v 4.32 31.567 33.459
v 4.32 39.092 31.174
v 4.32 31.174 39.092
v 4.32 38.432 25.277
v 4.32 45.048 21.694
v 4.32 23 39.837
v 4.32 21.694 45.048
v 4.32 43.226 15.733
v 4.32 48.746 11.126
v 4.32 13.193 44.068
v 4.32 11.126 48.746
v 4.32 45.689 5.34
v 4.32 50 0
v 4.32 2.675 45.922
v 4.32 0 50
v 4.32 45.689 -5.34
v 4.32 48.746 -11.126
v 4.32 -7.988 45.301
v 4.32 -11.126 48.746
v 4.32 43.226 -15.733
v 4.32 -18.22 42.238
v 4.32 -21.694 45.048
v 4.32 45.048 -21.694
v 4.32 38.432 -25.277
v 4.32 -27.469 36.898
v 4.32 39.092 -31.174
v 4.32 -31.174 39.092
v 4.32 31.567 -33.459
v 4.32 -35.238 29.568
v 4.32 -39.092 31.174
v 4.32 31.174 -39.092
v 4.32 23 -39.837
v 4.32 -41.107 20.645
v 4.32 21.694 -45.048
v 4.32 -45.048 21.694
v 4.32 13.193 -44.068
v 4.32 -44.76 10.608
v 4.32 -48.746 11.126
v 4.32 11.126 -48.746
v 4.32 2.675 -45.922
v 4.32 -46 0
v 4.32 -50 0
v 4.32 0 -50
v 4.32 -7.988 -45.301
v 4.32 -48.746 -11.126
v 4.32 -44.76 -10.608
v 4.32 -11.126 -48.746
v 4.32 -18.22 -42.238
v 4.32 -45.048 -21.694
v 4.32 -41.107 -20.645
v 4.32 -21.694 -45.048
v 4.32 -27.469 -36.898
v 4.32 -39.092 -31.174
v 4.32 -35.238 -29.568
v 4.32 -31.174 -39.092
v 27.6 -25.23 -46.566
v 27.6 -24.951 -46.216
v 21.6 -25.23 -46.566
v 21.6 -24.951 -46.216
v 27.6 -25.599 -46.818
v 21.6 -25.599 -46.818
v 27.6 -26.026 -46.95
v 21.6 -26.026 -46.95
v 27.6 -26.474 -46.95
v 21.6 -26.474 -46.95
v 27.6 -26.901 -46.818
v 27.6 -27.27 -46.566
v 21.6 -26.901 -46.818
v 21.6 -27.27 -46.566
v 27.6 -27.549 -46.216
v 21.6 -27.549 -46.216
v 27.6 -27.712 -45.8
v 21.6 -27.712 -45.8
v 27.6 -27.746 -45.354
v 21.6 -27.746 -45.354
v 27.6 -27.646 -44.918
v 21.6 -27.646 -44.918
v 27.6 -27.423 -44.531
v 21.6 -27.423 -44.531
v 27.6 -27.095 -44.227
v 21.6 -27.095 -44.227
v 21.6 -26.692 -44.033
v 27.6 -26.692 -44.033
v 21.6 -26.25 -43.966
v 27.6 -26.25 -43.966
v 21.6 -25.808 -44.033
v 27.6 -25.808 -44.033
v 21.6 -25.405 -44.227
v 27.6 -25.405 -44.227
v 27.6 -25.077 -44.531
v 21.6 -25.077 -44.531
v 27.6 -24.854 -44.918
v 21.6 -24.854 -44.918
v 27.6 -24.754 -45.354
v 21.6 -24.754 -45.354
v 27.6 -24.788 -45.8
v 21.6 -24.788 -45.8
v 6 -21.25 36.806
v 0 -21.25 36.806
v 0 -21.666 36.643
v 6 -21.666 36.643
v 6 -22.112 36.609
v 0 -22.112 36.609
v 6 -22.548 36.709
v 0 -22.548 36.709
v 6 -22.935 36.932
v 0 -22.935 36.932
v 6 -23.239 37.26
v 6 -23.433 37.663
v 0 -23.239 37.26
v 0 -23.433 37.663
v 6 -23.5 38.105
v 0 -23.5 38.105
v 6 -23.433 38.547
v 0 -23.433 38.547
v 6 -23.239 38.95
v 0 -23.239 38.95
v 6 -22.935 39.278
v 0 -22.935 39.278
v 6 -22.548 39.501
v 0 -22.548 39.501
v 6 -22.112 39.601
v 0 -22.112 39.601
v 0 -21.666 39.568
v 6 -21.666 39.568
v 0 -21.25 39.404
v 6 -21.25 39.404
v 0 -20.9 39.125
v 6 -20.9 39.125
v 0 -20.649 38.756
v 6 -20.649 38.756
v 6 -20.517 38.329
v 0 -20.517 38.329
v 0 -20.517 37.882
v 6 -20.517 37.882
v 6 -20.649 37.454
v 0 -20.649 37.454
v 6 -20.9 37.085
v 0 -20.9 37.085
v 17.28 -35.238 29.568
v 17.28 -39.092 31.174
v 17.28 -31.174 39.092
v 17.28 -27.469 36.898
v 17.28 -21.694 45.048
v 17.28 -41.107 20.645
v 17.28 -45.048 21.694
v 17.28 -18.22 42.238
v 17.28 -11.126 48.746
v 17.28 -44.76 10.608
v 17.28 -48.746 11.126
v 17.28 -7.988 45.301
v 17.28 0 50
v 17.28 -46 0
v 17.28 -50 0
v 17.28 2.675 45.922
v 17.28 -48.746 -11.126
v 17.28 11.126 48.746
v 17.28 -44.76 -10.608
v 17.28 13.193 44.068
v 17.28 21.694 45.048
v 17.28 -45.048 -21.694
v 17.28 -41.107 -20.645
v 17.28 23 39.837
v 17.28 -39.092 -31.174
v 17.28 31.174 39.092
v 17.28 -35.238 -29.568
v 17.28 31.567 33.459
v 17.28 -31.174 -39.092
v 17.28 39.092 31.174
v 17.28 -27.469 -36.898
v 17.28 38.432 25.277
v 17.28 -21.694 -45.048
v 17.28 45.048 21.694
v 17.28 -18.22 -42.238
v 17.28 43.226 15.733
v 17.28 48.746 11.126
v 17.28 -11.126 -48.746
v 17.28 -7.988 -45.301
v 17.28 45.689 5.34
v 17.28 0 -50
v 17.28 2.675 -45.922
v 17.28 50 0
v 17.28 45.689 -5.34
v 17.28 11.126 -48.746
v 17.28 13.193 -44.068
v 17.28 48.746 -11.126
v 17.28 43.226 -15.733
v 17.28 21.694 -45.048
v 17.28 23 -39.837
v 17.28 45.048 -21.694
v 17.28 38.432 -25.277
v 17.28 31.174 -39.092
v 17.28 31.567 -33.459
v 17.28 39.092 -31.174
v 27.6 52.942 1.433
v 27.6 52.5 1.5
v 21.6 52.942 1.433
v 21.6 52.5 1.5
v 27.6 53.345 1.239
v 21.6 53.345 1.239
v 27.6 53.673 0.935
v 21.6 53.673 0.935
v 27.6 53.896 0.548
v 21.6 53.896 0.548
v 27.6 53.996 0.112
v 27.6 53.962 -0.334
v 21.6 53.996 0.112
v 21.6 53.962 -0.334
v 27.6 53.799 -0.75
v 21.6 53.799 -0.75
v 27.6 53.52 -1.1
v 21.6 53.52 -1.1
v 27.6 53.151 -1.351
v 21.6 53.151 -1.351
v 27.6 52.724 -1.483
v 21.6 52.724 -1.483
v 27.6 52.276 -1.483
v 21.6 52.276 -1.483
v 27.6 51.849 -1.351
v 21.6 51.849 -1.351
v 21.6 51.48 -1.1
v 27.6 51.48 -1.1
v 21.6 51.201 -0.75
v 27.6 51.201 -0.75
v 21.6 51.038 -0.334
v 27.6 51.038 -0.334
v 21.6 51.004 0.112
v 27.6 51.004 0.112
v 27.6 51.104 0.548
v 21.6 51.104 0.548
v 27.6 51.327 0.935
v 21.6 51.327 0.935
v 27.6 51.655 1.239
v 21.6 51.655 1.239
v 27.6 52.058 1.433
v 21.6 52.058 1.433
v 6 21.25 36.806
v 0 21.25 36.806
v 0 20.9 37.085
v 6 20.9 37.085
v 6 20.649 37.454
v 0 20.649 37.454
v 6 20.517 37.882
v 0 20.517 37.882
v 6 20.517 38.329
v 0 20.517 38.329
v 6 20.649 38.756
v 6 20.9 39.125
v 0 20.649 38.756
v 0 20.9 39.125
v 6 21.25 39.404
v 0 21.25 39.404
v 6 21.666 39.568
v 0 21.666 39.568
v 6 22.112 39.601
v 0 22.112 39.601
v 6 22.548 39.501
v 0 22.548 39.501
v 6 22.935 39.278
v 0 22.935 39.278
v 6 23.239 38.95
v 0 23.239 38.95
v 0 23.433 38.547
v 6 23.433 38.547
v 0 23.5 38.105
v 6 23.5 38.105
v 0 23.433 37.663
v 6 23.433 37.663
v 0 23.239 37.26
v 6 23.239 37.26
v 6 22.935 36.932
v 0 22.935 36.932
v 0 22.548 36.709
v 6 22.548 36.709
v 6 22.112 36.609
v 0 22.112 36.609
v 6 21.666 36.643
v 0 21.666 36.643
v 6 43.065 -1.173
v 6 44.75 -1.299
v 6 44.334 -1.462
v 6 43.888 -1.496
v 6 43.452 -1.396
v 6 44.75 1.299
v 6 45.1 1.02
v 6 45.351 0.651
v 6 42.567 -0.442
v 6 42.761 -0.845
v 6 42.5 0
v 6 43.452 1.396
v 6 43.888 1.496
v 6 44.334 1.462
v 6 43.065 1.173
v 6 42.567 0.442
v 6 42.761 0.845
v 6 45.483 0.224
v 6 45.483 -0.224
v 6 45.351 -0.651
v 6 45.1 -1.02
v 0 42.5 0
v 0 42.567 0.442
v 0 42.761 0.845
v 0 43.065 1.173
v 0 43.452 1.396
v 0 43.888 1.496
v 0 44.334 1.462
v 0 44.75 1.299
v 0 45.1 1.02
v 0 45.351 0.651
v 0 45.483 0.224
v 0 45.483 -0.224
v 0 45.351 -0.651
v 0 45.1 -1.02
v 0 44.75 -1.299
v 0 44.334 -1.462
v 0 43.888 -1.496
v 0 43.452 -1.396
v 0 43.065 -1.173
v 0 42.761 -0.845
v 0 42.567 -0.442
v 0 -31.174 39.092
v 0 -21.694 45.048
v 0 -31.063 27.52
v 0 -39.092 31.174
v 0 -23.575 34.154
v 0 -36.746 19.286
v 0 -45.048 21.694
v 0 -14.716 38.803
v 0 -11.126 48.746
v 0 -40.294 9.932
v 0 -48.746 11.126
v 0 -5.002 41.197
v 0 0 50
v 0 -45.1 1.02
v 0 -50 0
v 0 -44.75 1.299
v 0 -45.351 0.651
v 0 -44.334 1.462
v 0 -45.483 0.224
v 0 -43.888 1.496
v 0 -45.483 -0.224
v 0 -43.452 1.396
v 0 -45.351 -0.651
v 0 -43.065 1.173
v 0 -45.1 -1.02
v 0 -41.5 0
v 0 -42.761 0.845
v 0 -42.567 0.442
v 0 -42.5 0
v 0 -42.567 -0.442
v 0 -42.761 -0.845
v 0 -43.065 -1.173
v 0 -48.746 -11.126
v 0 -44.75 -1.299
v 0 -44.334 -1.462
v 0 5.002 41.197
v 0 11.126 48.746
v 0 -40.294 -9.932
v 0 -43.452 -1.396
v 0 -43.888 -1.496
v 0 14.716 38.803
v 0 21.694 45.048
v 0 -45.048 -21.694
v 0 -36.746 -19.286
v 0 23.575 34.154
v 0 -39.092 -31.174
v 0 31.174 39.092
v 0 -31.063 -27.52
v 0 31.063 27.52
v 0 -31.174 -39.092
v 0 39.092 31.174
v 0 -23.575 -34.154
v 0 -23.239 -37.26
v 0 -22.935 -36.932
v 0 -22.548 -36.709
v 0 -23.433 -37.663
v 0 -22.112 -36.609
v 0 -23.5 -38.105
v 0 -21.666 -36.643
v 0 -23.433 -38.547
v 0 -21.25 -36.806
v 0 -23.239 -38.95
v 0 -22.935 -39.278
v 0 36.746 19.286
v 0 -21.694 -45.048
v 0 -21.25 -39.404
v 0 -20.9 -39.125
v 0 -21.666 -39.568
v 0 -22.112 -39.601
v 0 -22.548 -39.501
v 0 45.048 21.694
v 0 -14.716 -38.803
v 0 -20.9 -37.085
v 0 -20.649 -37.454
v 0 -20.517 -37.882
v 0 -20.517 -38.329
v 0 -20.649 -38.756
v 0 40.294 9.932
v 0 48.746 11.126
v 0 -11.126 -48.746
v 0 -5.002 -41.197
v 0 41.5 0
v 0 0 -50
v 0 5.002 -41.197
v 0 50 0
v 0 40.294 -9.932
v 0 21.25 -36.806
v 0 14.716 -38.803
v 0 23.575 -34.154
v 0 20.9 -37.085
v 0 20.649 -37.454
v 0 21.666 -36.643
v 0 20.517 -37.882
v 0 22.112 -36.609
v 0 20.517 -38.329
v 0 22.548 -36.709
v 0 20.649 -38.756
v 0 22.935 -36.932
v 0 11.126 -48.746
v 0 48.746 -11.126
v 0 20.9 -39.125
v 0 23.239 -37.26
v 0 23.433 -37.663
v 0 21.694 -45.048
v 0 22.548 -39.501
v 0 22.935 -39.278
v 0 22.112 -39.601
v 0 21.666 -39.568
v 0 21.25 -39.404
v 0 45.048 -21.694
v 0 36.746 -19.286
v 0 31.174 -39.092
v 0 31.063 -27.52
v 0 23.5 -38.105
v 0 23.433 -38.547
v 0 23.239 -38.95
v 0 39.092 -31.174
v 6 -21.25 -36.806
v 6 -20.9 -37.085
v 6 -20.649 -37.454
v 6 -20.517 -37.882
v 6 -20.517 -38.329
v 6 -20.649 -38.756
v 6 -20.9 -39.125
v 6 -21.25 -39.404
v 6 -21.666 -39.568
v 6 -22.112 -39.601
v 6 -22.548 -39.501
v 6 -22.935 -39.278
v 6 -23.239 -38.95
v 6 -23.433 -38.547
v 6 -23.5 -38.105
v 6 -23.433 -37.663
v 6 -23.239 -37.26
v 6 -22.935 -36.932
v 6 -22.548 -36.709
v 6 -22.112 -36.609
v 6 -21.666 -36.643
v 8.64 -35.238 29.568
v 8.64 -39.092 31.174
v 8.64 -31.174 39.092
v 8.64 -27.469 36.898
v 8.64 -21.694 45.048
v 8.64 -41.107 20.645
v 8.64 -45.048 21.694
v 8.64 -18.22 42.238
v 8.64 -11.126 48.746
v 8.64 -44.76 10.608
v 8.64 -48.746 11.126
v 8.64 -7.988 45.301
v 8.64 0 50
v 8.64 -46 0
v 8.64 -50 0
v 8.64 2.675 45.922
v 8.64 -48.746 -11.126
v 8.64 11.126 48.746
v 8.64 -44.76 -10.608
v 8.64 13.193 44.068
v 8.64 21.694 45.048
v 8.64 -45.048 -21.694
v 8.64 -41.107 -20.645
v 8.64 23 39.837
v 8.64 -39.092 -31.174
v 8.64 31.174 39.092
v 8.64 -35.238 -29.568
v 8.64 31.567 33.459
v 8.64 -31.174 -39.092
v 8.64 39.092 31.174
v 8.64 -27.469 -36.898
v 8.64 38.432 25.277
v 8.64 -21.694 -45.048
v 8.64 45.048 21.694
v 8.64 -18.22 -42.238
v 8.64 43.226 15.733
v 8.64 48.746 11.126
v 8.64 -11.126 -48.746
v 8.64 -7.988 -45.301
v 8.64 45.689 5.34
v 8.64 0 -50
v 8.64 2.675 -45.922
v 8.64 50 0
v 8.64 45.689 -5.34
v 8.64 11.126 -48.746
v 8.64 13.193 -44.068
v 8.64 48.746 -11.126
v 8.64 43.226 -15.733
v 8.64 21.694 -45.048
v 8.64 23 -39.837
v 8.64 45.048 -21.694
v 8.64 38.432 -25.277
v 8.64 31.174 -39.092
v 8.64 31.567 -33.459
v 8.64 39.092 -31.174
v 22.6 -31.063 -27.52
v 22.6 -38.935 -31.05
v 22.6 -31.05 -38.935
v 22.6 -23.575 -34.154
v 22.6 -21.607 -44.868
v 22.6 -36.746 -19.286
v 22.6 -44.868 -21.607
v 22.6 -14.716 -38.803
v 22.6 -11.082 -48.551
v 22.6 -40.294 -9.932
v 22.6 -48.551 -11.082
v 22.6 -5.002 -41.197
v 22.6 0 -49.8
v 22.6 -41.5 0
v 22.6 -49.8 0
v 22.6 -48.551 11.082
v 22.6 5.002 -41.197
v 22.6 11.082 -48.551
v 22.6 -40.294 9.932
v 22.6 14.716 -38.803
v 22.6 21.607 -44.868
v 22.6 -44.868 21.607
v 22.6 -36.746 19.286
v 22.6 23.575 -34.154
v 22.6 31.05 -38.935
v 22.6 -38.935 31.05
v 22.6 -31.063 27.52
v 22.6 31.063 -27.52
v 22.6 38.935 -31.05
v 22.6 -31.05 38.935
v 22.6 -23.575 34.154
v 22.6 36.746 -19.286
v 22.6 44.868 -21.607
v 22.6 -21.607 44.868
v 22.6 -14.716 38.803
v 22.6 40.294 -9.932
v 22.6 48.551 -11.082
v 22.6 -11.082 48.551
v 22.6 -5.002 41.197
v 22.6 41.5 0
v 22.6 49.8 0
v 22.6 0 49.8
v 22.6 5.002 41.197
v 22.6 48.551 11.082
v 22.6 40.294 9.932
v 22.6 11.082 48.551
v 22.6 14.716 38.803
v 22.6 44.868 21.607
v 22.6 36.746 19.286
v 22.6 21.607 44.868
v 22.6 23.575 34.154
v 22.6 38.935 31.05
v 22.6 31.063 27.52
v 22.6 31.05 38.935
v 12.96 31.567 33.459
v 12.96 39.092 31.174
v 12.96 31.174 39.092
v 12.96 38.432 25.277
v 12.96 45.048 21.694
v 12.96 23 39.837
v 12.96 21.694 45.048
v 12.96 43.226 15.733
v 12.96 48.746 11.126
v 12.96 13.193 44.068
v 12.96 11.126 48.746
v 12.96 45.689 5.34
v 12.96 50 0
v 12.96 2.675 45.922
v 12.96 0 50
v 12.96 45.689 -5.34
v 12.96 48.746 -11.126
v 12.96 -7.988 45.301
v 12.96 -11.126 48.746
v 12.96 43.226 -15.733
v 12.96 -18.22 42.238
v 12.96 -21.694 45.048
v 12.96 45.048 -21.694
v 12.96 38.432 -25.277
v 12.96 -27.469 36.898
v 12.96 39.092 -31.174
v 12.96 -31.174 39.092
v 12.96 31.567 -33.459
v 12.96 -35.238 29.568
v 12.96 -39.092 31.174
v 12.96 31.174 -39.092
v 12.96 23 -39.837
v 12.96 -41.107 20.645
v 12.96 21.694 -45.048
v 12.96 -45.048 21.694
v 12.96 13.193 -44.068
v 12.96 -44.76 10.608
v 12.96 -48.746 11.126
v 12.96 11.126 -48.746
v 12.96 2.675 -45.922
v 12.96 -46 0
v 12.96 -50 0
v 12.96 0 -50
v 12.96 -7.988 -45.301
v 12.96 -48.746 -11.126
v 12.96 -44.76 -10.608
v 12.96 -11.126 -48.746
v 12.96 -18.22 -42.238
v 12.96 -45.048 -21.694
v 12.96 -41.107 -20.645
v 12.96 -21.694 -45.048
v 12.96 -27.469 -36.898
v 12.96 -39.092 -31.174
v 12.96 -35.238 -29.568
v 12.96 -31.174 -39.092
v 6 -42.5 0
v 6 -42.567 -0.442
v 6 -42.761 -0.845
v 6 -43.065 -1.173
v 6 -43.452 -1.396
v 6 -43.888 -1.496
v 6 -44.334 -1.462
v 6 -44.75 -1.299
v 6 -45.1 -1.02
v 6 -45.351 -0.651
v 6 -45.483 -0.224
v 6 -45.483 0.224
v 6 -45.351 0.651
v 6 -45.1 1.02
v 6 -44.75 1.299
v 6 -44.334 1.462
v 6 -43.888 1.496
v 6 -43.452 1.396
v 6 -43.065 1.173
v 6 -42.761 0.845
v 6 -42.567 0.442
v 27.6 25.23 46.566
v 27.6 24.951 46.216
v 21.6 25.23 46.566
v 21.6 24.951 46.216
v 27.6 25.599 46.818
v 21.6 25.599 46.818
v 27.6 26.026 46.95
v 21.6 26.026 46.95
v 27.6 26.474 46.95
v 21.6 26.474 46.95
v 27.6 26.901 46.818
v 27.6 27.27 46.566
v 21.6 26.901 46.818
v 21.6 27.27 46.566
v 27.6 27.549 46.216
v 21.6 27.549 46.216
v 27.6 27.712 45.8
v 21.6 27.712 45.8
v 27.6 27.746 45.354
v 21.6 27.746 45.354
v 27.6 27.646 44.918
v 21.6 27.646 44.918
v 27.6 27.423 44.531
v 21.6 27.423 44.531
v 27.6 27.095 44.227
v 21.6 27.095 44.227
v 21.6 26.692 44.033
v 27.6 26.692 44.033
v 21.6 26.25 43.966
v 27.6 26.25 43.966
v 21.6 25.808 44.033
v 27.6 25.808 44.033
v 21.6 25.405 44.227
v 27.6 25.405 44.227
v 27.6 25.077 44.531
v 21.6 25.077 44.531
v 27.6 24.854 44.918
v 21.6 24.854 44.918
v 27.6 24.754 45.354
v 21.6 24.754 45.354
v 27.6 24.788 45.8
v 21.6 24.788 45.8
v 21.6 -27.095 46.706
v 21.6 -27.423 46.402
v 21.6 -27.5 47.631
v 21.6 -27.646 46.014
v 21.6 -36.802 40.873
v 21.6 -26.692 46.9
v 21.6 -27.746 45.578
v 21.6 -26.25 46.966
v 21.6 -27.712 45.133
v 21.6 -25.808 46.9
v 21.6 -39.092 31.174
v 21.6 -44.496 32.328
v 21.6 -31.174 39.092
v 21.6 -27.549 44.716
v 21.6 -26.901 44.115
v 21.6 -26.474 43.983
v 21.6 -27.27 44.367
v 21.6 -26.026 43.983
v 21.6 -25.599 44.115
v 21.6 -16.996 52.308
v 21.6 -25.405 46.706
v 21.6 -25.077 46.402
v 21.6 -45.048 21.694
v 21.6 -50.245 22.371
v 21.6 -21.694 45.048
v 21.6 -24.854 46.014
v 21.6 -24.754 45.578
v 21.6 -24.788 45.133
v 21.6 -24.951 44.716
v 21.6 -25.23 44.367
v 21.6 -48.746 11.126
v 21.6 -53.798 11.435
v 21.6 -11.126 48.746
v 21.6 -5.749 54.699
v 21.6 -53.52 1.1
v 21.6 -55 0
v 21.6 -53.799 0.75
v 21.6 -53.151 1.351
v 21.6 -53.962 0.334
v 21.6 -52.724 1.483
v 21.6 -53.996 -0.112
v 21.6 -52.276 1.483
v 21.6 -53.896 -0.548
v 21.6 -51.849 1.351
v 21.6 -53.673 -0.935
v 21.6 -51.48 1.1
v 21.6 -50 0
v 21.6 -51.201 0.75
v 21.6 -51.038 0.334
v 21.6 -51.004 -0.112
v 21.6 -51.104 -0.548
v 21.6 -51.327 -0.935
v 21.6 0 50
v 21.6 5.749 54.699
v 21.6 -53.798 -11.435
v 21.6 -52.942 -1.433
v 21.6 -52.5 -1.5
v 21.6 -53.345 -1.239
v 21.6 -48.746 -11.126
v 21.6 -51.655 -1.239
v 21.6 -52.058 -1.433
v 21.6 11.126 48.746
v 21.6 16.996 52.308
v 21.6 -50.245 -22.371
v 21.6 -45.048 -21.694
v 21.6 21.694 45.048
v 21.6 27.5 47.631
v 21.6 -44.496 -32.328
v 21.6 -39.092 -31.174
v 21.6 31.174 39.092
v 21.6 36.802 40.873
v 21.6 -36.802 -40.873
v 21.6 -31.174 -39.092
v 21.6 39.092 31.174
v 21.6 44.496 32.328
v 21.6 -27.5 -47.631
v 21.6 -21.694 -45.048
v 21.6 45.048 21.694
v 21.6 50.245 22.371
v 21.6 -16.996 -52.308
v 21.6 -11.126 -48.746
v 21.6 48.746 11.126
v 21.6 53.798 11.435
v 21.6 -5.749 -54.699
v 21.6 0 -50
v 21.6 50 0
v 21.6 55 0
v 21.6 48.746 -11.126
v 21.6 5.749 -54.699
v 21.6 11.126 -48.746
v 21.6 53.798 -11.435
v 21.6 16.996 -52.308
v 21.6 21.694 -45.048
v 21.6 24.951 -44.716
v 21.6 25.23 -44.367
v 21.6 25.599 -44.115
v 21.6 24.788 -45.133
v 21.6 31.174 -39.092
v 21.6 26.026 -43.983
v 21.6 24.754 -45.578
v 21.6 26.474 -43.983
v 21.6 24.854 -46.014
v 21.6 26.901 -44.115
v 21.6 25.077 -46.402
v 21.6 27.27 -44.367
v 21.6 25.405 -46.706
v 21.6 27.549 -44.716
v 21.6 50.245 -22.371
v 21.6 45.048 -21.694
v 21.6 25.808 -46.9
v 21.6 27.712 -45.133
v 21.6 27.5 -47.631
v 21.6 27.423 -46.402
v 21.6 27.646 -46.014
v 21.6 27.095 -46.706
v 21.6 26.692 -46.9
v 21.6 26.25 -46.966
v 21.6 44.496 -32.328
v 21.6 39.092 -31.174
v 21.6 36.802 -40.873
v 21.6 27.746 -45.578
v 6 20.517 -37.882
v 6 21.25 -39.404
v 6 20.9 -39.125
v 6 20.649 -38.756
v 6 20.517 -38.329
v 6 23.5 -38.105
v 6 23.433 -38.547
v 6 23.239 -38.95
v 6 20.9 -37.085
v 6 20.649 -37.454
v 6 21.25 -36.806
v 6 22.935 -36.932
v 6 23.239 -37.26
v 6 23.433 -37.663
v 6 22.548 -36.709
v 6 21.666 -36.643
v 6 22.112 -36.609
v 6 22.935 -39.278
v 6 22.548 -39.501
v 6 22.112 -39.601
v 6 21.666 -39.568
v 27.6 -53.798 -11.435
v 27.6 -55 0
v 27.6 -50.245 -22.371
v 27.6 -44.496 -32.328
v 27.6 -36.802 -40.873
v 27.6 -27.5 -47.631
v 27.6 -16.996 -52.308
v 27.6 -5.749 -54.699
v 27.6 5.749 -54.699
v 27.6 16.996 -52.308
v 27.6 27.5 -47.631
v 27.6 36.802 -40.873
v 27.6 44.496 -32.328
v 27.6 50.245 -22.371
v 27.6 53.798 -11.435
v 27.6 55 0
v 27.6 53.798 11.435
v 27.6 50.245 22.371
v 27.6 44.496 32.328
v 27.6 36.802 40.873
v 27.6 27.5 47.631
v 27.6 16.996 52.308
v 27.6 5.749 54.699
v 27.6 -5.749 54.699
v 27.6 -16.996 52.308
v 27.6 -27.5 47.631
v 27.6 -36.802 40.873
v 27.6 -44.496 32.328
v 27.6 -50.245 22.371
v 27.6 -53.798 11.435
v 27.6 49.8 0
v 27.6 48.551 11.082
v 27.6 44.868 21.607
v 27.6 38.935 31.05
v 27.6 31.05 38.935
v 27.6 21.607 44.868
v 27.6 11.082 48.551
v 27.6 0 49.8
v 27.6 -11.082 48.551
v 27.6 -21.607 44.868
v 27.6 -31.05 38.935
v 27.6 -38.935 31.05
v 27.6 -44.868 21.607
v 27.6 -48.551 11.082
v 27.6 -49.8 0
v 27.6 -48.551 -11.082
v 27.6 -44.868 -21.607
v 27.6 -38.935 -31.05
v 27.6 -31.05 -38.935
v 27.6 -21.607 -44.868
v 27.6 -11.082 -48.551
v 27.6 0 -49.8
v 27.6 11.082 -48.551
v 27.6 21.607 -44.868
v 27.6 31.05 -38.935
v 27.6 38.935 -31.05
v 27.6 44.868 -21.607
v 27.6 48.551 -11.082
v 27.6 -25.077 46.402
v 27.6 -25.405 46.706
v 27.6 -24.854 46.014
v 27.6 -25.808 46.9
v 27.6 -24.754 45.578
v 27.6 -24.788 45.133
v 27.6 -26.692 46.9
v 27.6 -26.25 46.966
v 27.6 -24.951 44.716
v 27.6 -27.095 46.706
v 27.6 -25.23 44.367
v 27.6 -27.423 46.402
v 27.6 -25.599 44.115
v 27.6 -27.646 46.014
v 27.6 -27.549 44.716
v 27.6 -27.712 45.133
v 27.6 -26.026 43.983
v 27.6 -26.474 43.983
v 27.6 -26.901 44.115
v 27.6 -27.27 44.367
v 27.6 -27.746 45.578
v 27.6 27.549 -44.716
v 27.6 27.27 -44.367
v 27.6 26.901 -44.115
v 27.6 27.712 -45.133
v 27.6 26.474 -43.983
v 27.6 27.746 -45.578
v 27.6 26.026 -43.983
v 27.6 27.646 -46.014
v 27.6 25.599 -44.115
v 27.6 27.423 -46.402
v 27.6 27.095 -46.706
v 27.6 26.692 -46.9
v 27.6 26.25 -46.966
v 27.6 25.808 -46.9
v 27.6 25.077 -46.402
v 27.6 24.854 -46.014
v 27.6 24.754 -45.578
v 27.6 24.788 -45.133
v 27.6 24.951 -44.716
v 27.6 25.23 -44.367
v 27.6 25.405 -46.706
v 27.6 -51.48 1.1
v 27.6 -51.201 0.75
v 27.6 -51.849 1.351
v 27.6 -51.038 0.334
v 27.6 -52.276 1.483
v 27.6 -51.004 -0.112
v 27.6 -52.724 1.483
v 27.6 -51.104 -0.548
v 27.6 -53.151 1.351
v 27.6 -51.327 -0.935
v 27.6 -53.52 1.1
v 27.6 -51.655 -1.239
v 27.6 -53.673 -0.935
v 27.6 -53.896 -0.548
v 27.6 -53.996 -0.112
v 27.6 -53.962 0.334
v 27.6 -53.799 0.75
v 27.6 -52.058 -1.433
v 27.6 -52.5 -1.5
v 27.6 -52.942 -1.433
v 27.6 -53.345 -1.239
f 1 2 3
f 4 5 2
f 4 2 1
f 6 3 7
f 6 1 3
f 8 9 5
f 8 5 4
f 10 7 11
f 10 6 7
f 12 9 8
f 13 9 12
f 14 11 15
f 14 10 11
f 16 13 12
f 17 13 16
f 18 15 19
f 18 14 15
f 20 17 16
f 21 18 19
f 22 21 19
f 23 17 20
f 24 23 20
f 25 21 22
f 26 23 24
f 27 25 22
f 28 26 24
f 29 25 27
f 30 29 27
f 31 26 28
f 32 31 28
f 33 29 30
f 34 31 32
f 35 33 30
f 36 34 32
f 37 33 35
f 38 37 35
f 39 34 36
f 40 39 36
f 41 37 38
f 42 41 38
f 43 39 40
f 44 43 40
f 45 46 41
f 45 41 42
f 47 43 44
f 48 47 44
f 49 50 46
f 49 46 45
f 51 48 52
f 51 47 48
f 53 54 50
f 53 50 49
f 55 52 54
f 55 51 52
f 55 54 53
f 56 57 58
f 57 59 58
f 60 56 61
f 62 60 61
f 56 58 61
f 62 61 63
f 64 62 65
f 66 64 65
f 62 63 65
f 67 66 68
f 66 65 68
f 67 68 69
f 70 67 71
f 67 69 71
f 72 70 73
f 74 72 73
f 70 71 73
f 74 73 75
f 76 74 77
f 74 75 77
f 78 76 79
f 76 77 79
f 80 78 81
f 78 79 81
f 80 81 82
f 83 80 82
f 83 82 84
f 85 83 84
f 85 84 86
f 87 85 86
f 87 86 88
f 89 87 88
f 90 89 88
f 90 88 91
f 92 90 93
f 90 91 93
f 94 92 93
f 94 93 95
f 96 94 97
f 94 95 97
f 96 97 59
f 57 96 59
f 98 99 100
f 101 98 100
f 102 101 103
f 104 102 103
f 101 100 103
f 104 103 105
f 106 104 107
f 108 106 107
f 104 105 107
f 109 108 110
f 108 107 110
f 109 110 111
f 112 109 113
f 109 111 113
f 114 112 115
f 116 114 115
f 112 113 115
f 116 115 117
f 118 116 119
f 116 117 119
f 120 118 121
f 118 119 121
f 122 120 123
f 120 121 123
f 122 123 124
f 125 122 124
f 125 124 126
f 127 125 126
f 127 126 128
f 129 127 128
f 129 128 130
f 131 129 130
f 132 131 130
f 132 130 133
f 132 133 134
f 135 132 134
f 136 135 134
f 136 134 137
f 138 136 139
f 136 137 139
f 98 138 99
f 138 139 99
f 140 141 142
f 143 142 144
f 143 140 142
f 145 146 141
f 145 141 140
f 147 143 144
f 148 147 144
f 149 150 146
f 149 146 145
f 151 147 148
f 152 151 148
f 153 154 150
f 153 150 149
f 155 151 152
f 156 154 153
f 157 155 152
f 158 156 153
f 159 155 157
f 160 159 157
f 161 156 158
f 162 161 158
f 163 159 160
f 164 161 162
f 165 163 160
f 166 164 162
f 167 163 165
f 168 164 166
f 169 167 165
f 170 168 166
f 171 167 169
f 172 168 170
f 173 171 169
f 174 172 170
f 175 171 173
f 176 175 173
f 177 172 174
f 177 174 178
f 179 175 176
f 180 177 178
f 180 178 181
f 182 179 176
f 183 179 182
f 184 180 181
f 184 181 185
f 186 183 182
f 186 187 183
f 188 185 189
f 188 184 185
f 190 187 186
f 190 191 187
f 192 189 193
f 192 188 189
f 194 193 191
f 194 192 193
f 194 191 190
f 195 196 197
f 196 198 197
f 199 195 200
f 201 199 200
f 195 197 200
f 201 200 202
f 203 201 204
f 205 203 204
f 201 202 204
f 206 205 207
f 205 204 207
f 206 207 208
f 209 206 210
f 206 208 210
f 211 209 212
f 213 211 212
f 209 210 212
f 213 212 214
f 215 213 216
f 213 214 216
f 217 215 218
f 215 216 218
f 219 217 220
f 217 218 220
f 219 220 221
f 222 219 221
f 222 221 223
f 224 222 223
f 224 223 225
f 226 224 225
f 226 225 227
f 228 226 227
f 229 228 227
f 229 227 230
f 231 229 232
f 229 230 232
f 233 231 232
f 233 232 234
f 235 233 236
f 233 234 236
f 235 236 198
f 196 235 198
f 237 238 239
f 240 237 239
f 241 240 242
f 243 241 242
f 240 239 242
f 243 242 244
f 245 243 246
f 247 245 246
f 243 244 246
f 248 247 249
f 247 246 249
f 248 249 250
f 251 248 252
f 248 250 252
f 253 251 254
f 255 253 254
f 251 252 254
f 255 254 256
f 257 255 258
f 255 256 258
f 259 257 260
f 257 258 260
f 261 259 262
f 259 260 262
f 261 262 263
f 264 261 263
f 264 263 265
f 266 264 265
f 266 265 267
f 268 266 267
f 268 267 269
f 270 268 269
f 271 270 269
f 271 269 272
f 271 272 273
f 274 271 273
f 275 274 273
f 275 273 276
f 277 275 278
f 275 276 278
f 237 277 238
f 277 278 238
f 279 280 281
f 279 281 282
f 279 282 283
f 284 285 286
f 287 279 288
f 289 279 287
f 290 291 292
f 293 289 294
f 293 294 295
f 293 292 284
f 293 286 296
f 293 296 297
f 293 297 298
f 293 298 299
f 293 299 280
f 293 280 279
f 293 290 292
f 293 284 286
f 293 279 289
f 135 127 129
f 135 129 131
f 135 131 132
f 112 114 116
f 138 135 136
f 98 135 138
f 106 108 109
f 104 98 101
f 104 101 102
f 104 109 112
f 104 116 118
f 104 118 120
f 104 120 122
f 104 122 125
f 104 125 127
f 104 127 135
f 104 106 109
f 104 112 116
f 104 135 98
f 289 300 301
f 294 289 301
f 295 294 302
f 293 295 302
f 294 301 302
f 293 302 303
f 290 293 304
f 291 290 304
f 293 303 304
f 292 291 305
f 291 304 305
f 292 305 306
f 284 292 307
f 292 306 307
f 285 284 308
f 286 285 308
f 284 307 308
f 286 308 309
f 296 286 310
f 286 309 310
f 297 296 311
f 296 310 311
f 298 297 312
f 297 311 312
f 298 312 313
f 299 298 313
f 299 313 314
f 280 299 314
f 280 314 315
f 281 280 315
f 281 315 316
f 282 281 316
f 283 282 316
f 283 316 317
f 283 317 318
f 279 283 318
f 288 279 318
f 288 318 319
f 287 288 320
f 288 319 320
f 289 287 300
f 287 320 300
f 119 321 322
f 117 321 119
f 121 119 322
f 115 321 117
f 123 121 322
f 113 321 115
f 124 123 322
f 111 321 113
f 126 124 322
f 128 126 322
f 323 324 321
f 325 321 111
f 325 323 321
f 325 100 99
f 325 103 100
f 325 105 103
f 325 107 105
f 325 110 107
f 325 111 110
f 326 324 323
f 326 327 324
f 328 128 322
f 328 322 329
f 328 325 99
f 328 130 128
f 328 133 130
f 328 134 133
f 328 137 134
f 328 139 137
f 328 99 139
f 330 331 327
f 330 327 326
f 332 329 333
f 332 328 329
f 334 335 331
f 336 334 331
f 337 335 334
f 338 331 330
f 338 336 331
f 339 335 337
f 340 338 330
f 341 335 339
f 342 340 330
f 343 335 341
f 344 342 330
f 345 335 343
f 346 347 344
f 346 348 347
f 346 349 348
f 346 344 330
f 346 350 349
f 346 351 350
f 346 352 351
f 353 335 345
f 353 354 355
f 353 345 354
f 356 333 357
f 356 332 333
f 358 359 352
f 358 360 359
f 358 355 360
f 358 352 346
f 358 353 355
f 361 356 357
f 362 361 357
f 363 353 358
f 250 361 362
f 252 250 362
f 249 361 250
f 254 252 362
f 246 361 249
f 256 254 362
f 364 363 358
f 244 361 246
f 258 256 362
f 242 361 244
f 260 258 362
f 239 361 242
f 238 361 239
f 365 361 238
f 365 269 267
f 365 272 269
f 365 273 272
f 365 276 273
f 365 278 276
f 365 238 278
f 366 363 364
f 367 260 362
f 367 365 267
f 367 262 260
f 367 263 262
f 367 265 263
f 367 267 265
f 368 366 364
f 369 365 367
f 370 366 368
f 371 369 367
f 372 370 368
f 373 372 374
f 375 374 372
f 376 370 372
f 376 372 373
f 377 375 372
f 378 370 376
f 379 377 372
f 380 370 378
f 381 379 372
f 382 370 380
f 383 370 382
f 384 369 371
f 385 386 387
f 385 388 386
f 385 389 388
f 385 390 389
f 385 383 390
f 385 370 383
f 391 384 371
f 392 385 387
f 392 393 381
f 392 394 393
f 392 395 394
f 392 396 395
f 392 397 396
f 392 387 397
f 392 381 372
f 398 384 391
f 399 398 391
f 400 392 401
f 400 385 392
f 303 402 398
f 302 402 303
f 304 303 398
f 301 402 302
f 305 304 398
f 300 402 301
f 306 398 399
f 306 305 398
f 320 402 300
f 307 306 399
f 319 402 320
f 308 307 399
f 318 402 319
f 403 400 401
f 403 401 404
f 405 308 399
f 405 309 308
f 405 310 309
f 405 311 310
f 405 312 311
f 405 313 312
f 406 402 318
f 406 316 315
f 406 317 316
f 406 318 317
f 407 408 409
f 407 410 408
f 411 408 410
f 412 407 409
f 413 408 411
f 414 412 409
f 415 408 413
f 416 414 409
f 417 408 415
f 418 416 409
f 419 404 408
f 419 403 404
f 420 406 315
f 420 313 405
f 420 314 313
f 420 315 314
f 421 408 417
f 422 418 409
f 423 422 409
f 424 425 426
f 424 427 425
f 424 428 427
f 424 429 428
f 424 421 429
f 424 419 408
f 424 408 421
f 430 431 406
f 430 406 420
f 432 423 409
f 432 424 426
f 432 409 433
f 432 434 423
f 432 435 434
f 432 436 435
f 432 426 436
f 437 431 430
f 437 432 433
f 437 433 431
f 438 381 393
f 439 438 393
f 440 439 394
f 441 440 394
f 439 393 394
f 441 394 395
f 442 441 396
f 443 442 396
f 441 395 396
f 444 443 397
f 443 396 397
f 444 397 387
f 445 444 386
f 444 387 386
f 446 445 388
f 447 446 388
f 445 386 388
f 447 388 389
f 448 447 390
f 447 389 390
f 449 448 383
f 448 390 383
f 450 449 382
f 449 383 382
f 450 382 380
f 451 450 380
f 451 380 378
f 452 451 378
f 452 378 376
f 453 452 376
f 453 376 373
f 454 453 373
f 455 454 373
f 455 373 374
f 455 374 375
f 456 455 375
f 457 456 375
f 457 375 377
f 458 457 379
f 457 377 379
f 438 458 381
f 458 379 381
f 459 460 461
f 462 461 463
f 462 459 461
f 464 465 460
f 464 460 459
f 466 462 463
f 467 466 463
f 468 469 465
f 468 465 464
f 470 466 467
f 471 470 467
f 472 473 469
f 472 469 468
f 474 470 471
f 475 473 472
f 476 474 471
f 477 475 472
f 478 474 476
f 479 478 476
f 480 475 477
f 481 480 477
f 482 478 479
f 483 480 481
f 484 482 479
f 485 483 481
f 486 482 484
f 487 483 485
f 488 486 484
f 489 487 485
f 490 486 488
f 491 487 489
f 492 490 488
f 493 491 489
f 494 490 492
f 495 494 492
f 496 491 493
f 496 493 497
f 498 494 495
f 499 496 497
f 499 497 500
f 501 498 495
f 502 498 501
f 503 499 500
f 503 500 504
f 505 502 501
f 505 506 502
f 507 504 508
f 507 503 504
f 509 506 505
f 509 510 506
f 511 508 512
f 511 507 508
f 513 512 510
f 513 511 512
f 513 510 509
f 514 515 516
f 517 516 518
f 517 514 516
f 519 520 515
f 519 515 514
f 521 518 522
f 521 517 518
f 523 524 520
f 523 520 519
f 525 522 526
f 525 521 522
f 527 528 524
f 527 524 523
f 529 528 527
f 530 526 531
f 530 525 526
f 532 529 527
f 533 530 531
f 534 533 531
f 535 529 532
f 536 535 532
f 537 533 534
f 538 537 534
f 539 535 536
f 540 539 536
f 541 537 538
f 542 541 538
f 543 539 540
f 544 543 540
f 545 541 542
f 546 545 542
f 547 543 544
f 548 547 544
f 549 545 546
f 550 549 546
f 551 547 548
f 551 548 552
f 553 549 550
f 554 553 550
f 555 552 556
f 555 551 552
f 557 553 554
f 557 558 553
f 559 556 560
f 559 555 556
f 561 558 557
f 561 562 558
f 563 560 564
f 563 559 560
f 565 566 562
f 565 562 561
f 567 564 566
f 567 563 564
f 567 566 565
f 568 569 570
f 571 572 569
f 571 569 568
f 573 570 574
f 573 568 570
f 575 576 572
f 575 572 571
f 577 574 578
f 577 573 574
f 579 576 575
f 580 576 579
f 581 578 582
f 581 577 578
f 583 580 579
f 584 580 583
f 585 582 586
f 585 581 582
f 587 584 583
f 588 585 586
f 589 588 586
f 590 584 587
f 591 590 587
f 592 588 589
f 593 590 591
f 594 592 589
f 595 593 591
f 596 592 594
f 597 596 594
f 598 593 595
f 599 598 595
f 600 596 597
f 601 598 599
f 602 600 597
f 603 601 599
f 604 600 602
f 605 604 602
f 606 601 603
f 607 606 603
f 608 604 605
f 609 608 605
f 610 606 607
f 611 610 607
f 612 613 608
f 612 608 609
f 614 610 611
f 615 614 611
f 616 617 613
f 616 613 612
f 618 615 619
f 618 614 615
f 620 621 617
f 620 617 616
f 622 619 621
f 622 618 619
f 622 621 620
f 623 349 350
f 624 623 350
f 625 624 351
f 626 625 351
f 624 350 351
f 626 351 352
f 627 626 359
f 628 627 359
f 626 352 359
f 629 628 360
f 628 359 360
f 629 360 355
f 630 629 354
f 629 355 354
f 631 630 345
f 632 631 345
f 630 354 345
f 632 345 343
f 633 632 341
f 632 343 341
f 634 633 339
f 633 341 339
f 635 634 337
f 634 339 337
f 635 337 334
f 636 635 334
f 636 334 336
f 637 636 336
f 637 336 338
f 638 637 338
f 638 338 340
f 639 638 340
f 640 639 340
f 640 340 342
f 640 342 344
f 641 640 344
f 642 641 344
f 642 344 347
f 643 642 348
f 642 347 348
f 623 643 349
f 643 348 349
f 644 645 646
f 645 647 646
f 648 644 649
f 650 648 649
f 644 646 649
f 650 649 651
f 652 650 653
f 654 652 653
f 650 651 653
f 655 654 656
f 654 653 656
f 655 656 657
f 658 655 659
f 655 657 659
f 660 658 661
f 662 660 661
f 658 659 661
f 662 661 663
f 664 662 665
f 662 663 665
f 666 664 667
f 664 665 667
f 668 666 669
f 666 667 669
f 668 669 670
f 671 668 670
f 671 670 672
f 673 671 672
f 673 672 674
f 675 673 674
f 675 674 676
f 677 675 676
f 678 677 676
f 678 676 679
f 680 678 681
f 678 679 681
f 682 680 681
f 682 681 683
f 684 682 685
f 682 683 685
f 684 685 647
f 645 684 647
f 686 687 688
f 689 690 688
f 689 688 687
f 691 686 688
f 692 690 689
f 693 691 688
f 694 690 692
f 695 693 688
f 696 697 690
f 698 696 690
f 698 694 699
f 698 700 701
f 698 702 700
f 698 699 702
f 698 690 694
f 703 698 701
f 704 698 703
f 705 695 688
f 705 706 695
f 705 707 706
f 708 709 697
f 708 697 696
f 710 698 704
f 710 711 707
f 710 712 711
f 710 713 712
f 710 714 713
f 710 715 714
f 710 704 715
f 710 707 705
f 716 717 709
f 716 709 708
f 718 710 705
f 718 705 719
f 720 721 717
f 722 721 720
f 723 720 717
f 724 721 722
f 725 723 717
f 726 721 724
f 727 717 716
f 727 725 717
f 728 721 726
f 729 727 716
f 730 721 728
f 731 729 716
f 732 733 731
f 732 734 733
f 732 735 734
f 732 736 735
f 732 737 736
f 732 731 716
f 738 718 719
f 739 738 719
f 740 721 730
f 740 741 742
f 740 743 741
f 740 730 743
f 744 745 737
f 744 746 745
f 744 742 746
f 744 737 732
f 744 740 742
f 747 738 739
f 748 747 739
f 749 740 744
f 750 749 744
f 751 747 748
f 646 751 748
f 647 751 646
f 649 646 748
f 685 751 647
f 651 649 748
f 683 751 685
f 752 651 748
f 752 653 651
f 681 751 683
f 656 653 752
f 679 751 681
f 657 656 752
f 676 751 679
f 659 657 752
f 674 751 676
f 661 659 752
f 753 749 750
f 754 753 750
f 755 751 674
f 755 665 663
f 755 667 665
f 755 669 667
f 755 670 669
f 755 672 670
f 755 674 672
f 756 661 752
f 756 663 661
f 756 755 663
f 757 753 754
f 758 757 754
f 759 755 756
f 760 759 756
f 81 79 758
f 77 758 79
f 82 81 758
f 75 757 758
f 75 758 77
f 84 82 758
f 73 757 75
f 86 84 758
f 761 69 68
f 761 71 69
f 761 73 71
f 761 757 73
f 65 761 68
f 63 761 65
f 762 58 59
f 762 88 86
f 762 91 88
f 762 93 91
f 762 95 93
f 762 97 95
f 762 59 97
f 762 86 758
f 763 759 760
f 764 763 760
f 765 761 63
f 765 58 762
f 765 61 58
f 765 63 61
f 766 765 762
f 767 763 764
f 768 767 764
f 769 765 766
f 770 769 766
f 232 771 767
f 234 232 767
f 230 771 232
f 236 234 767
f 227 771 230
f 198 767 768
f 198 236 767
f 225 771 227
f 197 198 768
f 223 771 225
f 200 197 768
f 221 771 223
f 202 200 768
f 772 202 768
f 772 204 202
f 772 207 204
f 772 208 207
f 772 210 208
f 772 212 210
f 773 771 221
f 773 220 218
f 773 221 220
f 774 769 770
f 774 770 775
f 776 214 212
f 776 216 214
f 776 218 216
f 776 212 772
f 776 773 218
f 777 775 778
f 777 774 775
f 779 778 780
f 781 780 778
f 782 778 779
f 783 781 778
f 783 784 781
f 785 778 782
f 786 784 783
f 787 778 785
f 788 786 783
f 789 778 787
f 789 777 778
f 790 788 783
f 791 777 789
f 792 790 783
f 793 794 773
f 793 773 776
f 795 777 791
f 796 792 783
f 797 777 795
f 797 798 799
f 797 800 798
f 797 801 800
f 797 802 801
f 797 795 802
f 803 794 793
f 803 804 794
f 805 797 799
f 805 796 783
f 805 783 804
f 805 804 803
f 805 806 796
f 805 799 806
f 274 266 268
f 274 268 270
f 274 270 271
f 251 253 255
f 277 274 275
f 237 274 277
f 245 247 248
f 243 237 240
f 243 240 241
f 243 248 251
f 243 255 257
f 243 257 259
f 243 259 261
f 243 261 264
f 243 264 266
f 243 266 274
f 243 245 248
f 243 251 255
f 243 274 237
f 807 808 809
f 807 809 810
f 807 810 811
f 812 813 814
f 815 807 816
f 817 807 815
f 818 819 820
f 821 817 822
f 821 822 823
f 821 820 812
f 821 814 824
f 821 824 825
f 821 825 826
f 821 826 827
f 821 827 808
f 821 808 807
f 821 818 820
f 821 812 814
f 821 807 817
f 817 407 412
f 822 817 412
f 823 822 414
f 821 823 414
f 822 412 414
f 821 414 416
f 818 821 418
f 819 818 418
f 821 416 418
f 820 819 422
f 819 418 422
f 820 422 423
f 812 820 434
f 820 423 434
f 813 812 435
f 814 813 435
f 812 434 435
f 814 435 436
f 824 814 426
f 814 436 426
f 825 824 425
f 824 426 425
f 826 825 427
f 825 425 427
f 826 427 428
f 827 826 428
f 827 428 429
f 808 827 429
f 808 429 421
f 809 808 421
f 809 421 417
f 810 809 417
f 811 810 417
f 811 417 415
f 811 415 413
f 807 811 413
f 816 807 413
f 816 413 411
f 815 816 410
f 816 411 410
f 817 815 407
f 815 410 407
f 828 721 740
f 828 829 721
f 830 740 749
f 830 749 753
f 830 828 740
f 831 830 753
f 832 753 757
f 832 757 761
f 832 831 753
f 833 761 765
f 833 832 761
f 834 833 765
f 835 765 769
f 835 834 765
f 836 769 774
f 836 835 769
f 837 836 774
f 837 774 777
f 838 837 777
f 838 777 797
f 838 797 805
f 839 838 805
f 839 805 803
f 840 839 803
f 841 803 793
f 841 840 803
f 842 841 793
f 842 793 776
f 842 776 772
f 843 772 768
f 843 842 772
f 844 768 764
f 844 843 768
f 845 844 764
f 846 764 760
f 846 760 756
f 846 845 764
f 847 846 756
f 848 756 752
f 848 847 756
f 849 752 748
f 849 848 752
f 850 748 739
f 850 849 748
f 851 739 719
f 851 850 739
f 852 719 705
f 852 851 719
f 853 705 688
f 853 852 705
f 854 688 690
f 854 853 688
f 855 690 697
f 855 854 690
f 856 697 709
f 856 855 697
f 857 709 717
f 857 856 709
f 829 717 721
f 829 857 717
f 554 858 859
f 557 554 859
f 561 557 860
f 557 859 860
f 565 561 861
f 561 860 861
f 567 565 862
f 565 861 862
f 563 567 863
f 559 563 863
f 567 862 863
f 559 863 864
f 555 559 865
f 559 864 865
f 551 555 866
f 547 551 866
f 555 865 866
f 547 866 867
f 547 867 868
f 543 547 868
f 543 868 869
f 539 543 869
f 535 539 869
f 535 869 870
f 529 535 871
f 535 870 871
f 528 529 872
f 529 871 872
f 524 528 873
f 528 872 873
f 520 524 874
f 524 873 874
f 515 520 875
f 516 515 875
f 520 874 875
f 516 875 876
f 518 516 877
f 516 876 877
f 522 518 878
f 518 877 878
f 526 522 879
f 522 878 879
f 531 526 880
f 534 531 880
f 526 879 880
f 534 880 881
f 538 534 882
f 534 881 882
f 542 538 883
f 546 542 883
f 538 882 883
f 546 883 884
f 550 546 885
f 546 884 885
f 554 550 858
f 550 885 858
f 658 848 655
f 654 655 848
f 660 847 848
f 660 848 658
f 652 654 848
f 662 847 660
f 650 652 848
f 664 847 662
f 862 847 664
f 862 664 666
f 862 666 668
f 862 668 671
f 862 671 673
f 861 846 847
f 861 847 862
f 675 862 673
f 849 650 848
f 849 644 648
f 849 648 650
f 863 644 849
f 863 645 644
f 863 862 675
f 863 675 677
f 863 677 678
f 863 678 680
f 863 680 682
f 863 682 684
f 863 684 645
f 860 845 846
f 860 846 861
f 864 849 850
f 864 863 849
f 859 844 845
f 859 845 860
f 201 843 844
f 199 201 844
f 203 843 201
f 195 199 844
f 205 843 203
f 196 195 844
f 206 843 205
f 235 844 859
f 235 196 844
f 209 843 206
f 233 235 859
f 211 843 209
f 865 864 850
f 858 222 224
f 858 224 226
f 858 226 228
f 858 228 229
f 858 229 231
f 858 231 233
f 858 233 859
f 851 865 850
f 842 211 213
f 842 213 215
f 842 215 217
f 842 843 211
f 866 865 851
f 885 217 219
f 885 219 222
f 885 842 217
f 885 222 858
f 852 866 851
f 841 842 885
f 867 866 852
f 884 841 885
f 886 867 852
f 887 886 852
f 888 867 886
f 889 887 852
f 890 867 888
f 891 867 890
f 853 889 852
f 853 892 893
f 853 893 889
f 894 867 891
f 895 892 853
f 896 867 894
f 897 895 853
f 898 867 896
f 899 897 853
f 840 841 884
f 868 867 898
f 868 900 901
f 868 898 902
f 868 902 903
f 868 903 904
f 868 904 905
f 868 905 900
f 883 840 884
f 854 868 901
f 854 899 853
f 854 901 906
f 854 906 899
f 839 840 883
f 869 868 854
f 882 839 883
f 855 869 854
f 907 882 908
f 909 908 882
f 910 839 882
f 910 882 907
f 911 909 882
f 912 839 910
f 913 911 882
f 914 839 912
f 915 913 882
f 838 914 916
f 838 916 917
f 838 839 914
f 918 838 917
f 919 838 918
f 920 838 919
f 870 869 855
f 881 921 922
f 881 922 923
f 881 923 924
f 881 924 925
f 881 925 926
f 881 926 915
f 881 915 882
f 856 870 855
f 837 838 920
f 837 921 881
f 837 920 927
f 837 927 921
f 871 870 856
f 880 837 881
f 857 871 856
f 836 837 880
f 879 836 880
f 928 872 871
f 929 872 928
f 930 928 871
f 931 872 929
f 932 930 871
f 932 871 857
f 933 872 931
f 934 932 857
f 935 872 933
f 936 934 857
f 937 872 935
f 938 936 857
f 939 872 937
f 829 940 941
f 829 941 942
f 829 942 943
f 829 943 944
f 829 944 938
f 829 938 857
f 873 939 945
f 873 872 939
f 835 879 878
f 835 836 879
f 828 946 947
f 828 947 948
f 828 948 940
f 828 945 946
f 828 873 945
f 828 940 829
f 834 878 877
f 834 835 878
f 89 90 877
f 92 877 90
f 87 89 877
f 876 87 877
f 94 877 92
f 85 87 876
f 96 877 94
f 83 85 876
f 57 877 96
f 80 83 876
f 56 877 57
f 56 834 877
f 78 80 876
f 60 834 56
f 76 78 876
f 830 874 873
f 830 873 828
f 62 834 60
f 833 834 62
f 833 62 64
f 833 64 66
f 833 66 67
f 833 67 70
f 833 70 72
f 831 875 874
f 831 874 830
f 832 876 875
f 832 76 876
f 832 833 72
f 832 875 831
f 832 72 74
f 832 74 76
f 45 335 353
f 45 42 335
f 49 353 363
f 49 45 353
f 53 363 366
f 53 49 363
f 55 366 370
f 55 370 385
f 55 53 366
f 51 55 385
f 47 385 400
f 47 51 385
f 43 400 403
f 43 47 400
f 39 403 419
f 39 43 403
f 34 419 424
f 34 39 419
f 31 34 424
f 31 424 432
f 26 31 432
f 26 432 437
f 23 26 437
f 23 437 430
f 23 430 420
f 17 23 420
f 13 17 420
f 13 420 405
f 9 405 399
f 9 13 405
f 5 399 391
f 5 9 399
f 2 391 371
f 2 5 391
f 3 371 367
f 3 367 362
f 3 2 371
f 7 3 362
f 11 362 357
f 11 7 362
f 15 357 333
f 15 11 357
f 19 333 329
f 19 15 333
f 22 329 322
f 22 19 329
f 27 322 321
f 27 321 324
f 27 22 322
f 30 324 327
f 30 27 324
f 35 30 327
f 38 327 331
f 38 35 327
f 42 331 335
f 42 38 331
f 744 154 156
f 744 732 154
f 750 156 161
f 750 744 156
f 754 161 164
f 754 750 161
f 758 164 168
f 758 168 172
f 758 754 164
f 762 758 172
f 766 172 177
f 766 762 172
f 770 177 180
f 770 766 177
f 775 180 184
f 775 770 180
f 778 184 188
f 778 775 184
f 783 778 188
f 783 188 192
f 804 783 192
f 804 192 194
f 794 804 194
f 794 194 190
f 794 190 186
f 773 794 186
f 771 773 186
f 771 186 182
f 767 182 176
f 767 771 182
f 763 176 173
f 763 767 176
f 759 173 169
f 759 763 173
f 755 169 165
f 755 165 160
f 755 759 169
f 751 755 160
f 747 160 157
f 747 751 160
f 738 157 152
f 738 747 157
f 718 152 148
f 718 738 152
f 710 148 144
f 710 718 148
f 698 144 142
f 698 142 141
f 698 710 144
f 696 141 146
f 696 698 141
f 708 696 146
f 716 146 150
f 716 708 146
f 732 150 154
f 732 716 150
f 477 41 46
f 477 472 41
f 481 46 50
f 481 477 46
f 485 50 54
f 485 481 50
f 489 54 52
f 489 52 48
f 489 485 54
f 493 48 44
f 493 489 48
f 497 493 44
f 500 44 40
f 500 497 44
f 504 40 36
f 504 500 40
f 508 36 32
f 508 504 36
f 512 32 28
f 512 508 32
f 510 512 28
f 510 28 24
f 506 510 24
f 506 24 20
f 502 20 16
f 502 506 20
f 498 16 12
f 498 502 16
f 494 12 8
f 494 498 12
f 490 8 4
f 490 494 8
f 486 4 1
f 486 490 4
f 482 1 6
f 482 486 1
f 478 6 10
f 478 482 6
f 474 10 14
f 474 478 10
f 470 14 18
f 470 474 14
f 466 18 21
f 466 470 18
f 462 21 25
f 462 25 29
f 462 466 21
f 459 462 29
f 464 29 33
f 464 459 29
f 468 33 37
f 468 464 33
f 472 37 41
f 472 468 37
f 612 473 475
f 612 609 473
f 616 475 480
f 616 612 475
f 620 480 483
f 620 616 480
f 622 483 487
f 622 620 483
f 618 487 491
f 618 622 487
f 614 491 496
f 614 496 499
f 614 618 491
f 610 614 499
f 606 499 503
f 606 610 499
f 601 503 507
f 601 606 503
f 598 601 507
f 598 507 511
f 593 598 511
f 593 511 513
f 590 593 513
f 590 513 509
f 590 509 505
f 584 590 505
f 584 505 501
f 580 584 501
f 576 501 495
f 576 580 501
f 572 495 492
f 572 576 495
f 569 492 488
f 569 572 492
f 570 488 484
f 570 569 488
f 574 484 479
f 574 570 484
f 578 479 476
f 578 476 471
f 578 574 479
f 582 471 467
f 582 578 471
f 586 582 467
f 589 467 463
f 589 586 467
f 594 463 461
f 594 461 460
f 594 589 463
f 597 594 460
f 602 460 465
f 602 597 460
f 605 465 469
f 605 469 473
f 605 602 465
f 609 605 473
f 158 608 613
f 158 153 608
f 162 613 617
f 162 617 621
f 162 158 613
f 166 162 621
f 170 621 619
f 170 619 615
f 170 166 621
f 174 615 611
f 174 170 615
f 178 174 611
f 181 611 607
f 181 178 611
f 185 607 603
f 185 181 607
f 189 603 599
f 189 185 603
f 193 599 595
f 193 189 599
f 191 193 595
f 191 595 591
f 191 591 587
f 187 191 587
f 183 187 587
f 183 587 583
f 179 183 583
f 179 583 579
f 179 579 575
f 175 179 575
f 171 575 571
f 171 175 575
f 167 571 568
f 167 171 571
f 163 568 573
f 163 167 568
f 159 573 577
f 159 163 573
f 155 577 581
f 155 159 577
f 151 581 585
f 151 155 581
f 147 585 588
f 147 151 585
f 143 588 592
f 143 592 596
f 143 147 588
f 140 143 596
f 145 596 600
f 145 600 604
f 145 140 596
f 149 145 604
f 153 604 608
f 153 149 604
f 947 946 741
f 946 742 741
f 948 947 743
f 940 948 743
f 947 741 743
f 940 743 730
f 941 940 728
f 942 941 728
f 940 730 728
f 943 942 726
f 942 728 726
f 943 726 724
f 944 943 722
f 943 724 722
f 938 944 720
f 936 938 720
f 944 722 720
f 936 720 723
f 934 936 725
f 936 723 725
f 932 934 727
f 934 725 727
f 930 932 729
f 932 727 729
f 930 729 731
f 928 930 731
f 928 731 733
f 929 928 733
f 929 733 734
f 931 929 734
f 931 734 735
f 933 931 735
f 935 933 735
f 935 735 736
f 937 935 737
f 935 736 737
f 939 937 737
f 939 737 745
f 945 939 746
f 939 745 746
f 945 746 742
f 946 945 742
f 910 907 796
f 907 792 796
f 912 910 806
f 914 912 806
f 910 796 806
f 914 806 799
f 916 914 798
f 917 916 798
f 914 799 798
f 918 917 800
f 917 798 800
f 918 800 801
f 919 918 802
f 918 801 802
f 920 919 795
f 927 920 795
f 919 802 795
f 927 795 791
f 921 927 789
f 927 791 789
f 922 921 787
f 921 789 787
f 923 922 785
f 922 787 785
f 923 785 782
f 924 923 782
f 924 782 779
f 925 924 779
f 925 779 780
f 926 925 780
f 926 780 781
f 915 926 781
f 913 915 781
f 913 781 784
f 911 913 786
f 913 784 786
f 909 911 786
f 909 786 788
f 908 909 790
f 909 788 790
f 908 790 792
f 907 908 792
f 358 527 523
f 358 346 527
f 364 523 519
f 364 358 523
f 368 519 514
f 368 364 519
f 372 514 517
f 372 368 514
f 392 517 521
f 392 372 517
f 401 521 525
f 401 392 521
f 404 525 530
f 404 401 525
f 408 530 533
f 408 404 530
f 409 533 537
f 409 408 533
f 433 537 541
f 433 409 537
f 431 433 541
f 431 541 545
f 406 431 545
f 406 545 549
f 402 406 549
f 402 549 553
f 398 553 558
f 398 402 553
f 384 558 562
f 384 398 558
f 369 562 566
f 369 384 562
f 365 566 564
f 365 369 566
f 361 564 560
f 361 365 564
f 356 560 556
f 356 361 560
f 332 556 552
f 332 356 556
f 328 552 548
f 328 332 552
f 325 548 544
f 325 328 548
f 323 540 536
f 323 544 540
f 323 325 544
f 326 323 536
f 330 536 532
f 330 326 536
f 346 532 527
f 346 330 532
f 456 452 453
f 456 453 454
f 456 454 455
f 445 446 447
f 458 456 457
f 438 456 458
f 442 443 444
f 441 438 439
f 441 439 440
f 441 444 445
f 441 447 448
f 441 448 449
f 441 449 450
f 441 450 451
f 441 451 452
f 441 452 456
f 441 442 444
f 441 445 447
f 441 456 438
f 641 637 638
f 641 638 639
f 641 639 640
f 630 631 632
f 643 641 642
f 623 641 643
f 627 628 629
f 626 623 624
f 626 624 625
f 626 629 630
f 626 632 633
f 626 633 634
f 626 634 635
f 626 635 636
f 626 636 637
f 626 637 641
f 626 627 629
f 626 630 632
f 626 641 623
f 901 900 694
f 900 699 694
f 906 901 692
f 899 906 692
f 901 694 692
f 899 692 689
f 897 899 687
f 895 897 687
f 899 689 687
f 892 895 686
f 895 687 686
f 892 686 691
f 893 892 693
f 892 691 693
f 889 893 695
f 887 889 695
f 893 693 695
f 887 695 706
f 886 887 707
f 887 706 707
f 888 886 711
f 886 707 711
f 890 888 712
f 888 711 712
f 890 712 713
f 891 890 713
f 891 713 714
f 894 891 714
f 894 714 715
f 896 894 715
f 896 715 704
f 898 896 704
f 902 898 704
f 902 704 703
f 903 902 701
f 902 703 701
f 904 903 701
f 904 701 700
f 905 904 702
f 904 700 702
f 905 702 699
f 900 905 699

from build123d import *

# Parameters (mm, degrees)
SKETCH_2_R               = 1.5
CUT_EXTRUDE_1_DEPTH      = 6
PATTERN_CIRCULAR_1_COUNT = 6
SKETCH_3_R               = 1.5
CUT_EXTRUDE_2_DEPTH      = 81.725212914
PATTERN_CIRCULAR_2_COUNT = 6
SKETCH_4_R               = 49.8
CUT_EXTRUDE_3_DEPTH      = 5


with BuildPart() as part:
    # 草图1 → 旋转1 (revolve)
    with BuildSketch(Plane.XY, mode=Mode.PRIVATE) as revolve_1_sk:
        Polygon((0, 41.5), (0, 50), (4.32, 50), (4.32, 46), (8.64, 46), (8.64, 50), (12.96, 50), (12.96, 46), (17.28, 46), (17.28, 50), (21.6, 50), (21.6, 55), (27.6, 55), (27.6, 41.5), align=None)
    revolve(revolve_1_sk.sketch.rotate(Axis((27.6, 0, 0), (1, 0, 0)), 180), axis=Axis((27.6, 0, 0), (1, 0, 0)))

    # 草图2 → 切除-拉伸1 (cut)
    with BuildSketch(Plane.ZY):
        with Locations(Location((0, 44, 0), (0, 0, 270))):
            Circle(SKETCH_2_R)
    cut_extrude_1 = extrude(amount=-CUT_EXTRUDE_1_DEPTH, mode=Mode.SUBTRACT)

    # 阵列(圆周)1: 切除-拉伸1 ×6 about axis
    pattern_circular_1_axis = Axis((0, 0, 0), (1, 0, 0))
    for i in range(1, PATTERN_CIRCULAR_1_COUNT):
        add(cut_extrude_1.rotate(pattern_circular_1_axis, i * 360 / PATTERN_CIRCULAR_1_COUNT), mode=Mode.SUBTRACT)

    # 草图3 → 切除-拉伸2 (cut, symmetric)
    with BuildSketch(Plane.ZY.offset(-21.6)):
        with Locations((0, 52.5)):
            Circle(SKETCH_3_R)
    cut_extrude_2 = extrude(amount=CUT_EXTRUDE_2_DEPTH, both=True, mode=Mode.SUBTRACT)

    # 阵列(圆周)2: 切除-拉伸2 ×6 about axis
    pattern_circular_2_axis = Axis((0, 0, 0), (1, 0, 0))
    for i in range(1, PATTERN_CIRCULAR_2_COUNT):
        add(cut_extrude_2.rotate(pattern_circular_2_axis, i * 360 / PATTERN_CIRCULAR_2_COUNT), mode=Mode.SUBTRACT)

    # 草图4 → 切除-拉伸3 (cut)
    with BuildSketch(Plane(origin=(27.6, 0, 0), x_dir=(0, 0, -1), z_dir=(1, 0, 0))):
        with Locations(Location((0, 0, 0), (0, 0, 90))):
            Circle(SKETCH_4_R)
    extrude(amount=-CUT_EXTRUDE_3_DEPTH, mode=Mode.SUBTRACT)


solid = part.part
